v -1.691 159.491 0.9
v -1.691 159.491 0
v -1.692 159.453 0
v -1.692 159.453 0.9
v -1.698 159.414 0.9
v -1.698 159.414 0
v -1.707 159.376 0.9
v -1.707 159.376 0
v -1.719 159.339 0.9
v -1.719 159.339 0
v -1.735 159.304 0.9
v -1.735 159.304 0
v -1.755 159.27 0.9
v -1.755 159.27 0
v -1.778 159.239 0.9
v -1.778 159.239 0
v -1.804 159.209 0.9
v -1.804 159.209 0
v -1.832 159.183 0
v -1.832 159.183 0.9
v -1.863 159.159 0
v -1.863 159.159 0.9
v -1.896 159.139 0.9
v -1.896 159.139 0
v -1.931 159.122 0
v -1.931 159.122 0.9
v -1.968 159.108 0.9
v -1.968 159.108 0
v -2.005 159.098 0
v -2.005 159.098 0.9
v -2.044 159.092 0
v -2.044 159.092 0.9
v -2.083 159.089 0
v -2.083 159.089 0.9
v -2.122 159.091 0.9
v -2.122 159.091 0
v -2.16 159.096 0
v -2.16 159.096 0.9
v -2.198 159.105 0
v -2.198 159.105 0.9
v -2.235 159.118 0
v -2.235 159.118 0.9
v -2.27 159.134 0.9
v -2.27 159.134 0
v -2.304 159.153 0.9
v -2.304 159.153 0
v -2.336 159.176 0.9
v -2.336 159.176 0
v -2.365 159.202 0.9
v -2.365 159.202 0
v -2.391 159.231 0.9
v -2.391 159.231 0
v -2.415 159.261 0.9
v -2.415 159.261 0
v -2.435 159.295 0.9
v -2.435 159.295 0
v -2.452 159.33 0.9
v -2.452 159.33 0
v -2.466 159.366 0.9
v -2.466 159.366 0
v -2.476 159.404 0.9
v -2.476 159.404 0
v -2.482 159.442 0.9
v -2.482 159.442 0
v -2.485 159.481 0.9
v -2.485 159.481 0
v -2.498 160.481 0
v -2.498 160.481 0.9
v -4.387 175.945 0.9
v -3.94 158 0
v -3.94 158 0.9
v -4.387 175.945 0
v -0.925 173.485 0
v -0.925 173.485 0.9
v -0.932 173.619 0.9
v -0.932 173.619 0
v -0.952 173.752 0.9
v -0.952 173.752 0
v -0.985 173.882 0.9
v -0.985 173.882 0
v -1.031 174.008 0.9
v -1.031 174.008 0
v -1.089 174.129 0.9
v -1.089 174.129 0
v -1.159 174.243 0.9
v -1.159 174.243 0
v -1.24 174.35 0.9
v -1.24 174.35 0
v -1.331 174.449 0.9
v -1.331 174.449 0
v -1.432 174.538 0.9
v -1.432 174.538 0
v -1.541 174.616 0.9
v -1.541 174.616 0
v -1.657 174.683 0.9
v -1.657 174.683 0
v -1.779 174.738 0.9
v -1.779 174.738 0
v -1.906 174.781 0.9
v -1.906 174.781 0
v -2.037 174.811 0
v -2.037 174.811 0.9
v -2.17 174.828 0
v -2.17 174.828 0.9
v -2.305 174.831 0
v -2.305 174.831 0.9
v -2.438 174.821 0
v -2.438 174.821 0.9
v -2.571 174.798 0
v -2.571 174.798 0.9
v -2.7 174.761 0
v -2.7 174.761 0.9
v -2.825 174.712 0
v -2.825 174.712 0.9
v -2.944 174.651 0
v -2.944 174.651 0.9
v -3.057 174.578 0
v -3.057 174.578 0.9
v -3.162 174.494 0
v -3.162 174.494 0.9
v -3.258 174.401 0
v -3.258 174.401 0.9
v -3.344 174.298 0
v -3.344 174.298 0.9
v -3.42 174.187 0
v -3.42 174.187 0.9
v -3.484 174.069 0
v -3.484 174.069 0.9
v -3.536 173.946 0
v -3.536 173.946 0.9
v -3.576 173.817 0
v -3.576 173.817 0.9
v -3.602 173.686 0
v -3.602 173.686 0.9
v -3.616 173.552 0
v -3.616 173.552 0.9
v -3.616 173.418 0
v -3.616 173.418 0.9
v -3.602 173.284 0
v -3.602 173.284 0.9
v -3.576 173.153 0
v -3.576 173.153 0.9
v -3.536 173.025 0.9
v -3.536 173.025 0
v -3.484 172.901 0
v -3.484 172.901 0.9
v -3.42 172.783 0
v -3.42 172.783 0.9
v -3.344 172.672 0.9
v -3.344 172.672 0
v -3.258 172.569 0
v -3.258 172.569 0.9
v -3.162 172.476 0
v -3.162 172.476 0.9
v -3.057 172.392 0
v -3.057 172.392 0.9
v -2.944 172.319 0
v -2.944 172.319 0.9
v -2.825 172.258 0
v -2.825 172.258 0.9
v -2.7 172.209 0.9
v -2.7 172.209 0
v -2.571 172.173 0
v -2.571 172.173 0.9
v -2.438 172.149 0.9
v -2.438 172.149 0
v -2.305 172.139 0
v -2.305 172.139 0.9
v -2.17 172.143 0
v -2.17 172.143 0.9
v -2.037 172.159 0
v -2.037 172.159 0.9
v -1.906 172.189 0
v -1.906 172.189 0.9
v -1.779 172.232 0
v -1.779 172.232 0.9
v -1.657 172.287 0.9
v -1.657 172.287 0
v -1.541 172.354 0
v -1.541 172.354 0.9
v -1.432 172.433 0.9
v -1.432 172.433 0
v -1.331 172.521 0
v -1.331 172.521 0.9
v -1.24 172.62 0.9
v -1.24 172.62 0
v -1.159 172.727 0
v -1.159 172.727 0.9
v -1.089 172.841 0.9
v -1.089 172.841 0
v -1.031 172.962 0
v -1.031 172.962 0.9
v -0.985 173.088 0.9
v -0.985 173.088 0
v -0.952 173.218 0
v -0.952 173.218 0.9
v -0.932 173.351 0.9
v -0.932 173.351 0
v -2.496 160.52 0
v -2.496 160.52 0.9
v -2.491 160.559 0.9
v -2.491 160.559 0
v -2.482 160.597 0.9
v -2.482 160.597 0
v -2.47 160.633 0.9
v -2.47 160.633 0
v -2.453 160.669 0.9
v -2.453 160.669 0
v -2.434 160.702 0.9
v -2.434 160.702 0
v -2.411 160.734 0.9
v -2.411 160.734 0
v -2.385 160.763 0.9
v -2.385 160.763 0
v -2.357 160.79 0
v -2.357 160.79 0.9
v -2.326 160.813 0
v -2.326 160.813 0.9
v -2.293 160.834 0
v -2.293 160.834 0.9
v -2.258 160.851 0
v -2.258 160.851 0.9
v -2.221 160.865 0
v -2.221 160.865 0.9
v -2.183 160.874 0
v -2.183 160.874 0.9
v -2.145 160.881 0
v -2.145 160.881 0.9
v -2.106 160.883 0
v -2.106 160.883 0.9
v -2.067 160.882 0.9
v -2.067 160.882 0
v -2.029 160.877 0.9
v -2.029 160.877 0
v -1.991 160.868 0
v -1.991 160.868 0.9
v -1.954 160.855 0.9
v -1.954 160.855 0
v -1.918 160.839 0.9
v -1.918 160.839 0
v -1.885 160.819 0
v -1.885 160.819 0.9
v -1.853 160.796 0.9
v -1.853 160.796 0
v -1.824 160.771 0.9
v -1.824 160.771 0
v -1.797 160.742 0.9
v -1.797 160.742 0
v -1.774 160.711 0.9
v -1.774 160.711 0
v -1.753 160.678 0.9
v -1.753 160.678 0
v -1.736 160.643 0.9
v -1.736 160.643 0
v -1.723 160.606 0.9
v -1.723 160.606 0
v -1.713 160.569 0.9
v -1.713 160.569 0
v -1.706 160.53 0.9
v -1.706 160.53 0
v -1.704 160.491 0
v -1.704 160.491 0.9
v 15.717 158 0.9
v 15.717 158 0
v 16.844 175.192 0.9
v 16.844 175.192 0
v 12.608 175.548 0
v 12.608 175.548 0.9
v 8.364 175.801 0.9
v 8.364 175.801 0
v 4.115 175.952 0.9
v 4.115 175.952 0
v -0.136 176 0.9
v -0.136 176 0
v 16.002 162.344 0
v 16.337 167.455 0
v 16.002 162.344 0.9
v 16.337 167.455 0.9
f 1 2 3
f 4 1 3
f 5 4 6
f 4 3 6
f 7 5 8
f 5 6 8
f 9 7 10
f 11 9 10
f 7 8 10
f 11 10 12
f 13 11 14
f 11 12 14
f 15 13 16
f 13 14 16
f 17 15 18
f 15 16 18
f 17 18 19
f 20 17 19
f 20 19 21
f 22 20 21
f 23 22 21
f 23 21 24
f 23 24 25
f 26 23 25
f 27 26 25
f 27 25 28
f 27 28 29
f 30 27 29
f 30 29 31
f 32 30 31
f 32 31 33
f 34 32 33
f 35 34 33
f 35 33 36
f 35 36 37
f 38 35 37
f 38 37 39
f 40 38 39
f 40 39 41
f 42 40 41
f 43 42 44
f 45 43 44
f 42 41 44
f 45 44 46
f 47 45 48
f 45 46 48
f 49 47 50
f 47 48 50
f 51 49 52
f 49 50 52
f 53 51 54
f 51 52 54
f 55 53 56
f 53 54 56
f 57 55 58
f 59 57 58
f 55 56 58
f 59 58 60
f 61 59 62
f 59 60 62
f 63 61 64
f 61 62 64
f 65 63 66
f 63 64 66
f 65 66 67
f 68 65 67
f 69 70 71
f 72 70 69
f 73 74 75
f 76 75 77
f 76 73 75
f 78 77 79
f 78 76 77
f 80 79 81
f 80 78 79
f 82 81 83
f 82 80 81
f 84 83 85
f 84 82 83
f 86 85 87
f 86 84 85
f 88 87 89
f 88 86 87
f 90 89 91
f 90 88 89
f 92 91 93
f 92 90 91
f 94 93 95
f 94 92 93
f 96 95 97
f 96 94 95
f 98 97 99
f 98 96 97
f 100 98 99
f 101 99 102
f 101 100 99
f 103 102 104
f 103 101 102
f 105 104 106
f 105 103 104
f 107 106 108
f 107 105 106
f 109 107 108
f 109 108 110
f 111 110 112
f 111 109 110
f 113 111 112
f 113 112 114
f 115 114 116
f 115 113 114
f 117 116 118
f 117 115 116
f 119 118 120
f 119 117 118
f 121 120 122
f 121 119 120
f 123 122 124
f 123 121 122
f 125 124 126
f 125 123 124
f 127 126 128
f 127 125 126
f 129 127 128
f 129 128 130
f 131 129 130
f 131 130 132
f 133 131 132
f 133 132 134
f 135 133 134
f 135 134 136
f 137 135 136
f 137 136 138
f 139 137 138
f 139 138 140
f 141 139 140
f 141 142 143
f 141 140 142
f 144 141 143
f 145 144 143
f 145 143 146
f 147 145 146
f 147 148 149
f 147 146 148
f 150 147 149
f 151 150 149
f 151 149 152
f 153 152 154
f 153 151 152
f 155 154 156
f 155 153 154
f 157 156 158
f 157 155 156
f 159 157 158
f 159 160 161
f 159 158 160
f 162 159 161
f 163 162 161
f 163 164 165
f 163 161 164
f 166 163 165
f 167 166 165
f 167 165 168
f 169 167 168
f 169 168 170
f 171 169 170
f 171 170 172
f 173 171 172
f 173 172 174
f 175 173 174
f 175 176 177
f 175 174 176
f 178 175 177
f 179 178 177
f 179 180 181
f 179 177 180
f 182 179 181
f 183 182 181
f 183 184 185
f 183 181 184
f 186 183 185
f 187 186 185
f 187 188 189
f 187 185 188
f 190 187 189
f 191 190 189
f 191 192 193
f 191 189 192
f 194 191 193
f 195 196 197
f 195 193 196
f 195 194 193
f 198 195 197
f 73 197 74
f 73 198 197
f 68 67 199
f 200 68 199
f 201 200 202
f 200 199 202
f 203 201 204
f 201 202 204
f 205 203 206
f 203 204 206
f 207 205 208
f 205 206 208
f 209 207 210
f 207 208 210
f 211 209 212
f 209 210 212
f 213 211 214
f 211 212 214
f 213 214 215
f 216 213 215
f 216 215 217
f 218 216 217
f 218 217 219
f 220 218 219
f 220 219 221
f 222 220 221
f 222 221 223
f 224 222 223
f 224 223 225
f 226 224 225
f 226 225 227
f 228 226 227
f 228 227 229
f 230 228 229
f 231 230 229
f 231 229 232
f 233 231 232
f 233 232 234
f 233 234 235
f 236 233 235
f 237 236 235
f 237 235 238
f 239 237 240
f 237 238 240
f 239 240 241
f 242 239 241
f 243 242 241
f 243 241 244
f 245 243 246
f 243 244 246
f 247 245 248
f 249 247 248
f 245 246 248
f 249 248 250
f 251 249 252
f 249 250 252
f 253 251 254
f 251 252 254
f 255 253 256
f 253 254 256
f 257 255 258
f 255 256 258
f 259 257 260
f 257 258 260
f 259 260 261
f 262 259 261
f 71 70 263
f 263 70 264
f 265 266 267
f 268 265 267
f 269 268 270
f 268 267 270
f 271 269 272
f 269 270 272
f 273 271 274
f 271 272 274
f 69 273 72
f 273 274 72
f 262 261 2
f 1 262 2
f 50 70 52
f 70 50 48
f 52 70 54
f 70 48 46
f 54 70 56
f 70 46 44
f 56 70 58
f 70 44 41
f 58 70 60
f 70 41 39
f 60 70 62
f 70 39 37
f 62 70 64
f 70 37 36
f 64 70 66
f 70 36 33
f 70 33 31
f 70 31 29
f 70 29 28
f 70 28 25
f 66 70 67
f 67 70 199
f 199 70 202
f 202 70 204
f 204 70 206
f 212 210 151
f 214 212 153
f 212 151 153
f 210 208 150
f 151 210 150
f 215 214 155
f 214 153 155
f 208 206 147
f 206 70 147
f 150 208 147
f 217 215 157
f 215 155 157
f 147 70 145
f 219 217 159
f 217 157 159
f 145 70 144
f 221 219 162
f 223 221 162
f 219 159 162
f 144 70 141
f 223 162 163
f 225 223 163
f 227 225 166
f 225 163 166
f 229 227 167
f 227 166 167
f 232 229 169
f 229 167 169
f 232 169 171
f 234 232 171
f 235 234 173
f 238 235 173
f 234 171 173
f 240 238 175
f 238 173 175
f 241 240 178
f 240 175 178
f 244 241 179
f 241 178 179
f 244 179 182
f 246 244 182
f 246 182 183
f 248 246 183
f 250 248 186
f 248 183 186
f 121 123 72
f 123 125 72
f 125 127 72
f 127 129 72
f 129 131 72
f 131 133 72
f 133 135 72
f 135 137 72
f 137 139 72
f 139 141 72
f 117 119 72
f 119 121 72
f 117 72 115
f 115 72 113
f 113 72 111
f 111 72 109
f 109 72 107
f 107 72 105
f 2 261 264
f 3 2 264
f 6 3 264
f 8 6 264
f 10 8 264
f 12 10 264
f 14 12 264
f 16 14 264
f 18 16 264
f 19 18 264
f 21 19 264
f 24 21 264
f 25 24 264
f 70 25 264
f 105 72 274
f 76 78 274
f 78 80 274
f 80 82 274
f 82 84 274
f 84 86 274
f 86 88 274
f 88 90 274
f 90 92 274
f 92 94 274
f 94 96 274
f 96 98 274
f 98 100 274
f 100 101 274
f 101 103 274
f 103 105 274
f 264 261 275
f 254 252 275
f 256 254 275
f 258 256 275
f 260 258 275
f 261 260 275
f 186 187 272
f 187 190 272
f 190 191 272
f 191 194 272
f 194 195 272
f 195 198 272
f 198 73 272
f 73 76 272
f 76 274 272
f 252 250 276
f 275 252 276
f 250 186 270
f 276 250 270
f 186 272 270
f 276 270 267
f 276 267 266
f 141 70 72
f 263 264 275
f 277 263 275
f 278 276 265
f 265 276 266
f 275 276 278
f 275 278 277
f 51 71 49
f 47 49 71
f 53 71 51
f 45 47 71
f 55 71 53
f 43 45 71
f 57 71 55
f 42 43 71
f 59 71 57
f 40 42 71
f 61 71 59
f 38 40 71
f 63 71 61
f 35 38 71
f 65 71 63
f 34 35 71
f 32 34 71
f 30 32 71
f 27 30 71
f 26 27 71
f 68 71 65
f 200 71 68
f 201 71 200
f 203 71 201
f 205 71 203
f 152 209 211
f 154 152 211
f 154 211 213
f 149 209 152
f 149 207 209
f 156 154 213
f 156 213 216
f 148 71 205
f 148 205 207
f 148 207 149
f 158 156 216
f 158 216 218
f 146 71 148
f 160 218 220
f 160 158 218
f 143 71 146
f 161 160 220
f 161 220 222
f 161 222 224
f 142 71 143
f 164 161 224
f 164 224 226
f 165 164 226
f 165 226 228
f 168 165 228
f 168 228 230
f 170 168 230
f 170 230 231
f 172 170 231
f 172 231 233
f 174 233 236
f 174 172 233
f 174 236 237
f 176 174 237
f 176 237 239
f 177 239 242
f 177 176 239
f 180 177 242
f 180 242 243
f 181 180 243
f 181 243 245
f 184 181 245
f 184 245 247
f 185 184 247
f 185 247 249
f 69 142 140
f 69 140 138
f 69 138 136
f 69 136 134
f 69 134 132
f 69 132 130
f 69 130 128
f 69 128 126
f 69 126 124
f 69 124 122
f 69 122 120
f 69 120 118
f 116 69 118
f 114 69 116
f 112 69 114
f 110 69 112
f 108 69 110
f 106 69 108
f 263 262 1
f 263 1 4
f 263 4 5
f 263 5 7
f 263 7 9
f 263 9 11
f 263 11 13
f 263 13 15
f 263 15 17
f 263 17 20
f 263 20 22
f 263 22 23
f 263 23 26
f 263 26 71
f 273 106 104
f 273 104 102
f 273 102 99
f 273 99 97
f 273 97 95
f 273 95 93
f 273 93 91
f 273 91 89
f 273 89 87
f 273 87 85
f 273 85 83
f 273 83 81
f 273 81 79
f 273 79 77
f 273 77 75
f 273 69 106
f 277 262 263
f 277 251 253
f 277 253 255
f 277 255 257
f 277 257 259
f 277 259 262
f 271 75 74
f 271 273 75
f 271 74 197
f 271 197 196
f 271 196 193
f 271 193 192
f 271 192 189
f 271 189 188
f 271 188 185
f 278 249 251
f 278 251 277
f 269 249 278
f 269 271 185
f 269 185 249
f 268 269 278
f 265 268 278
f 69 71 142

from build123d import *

# Parameters (mm, degrees)
EXTRUDE1_DEPTH     = 0.9
EXTRUDE2_DEPTH     = 0.9
SKETCH3_R          = 1.346200001
CUT_EXTRUDE2_DEPTH = 1.9
EXTRUDE3_DEPTH     = 1.9
CUT_EXTRUDE3_DEPTH = 1.9
FILLET1_R          = 0.5
CUT_EXTRUDE4_DEPTH = 1.9


with BuildPart() as part:
    # Sketch1 → Extrude1 (new body)
    with BuildSketch(Plane.XY):
        Polygon((-16.337044405, 167.45476352), (16.337044405, 167.45476352), (16.002062475, 162.343926895), (-16.002062475, 162.343926895), align=None)
    extrude(amount=EXTRUDE1_DEPTH)

    # Sketch2 → Extrude2 (add)
    with BuildSketch(Plane(origin=(0, 0, 0), x_dir=(-1, 0, 0), z_dir=(0, 0, -1))):
        with BuildLine():
            Line((16.84417657, 175.192105175), (15.717346464, 158))
            Line((15.717346464, 158), (-15.717346464, 158))
            Line((-15.717346464, 158), (-16.84417657, 175.192105175))
            ThreePointArc((-16.84417657, 175.192105175), (0, 176), (16.84417657, 175.192105175))
        make_face()
    extrude(amount=-EXTRUDE2_DEPTH)

    # Sketch3 → Cut-Extrude2 (cut, through all)
    with BuildSketch(Plane.XY):
        with Locations((-2.271044833, 173.485135834)):
            Circle(SKETCH3_R)
        with BuildLine():
            Line((-1.704039652, 160.491487345), (-1.690948935, 159.491487345))
            ThreePointArc((-1.690948935, 159.491487345), (-2.082595001, 159.089451413), (-2.484630933, 159.481097479))
            Line((-2.484630933, 159.481097479), (-2.49772165, 160.481097479))
            ThreePointArc((-2.49772165, 160.481097479), (-2.106075584, 160.883133411), (-1.704039652, 160.491487345))
        make_face()
    extrude(amount=CUT_EXTRUDE2_DEPTH, mode=Mode.SUBTRACT)

    # Sketch4 → Extrude3 (cut, through all)
    with BuildSketch(Plane.XY.offset(0.9)):
        with BuildLine():
            Line((-12, 175.590432541), (-12, 171))
            ThreePointArc((-12, 171), (-12.292893219, 170.292893219), (-13, 170))
            Line((-13, 170), (-16.503868017, 170))
            Line((-16.503868017, 170), (-16.84417657, 175.192105175))
            ThreePointArc((-16.84417657, 175.192105175), (-14.423463408, 175.407992131), (-12, 175.590432541))
        make_face()
    extrude(amount=-EXTRUDE3_DEPTH, mode=Mode.SUBTRACT)

    # Sketch5 → Cut-Extrude3 (cut, through all)
    with BuildSketch(Plane.XY.offset(0.9)):
        with BuildLine():
            Line((-5.934879033, 175.899906796), (-5.934879033, 173.754533822))
            Line((-5.934879033, 173.754533822), (-13.425811407, 173.754533822))
            Line((-13.425811407, 173.754533822), (-13.425811407, 175.487172147))
            ThreePointArc((-13.425811407, 175.487172147), (-9.682544658, 175.733458194), (-5.934879033, 175.899906796))
        make_face()
    extrude(amount=-CUT_EXTRUDE3_DEPTH, mode=Mode.SUBTRACT)

    # Fillet1
    fillet1_edges = [part.edges().sort_by_distance(p)[0] for p in [
        (-5.934879033, 173.754533822, 0.45),
    ]]
    fillet(fillet1_edges, radius=FILLET1_R)

    # Sketch6 → Cut-Extrude4 (cut, through all)
    with BuildSketch(Plane(origin=(0, 0, 0), x_dir=(-1, 0, 0), z_dir=(0, 0, -1))):
        with BuildLine():
            Line((3.939992499, 158), (4.387488465, 175.945303845))
            ThreePointArc((4.387488465, 175.945303845), (5.161233662, 175.924306641), (5.934879033, 175.899906796))
            Line((5.934879033, 175.899906796), (5.934879033, 174.254533822))
            ThreePointArc((5.934879033, 174.254533822), (6.081325642, 173.900980431), (6.434879033, 173.754533822))
            Line((6.434879033, 173.754533822), (12, 173.754533822))
            Line((12, 173.754533822), (12, 171))
            ThreePointArc((12, 171), (12.292893219, 170.292893219), (13, 170))
            Line((13, 170), (16.503868017, 170))
            Line((16.503868017, 170), (15.717346464, 158))
            Line((15.717346464, 158), (3.939992499, 158))
        make_face()
    extrude(amount=-CUT_EXTRUDE4_DEPTH, mode=Mode.SUBTRACT)


solid = part.part
